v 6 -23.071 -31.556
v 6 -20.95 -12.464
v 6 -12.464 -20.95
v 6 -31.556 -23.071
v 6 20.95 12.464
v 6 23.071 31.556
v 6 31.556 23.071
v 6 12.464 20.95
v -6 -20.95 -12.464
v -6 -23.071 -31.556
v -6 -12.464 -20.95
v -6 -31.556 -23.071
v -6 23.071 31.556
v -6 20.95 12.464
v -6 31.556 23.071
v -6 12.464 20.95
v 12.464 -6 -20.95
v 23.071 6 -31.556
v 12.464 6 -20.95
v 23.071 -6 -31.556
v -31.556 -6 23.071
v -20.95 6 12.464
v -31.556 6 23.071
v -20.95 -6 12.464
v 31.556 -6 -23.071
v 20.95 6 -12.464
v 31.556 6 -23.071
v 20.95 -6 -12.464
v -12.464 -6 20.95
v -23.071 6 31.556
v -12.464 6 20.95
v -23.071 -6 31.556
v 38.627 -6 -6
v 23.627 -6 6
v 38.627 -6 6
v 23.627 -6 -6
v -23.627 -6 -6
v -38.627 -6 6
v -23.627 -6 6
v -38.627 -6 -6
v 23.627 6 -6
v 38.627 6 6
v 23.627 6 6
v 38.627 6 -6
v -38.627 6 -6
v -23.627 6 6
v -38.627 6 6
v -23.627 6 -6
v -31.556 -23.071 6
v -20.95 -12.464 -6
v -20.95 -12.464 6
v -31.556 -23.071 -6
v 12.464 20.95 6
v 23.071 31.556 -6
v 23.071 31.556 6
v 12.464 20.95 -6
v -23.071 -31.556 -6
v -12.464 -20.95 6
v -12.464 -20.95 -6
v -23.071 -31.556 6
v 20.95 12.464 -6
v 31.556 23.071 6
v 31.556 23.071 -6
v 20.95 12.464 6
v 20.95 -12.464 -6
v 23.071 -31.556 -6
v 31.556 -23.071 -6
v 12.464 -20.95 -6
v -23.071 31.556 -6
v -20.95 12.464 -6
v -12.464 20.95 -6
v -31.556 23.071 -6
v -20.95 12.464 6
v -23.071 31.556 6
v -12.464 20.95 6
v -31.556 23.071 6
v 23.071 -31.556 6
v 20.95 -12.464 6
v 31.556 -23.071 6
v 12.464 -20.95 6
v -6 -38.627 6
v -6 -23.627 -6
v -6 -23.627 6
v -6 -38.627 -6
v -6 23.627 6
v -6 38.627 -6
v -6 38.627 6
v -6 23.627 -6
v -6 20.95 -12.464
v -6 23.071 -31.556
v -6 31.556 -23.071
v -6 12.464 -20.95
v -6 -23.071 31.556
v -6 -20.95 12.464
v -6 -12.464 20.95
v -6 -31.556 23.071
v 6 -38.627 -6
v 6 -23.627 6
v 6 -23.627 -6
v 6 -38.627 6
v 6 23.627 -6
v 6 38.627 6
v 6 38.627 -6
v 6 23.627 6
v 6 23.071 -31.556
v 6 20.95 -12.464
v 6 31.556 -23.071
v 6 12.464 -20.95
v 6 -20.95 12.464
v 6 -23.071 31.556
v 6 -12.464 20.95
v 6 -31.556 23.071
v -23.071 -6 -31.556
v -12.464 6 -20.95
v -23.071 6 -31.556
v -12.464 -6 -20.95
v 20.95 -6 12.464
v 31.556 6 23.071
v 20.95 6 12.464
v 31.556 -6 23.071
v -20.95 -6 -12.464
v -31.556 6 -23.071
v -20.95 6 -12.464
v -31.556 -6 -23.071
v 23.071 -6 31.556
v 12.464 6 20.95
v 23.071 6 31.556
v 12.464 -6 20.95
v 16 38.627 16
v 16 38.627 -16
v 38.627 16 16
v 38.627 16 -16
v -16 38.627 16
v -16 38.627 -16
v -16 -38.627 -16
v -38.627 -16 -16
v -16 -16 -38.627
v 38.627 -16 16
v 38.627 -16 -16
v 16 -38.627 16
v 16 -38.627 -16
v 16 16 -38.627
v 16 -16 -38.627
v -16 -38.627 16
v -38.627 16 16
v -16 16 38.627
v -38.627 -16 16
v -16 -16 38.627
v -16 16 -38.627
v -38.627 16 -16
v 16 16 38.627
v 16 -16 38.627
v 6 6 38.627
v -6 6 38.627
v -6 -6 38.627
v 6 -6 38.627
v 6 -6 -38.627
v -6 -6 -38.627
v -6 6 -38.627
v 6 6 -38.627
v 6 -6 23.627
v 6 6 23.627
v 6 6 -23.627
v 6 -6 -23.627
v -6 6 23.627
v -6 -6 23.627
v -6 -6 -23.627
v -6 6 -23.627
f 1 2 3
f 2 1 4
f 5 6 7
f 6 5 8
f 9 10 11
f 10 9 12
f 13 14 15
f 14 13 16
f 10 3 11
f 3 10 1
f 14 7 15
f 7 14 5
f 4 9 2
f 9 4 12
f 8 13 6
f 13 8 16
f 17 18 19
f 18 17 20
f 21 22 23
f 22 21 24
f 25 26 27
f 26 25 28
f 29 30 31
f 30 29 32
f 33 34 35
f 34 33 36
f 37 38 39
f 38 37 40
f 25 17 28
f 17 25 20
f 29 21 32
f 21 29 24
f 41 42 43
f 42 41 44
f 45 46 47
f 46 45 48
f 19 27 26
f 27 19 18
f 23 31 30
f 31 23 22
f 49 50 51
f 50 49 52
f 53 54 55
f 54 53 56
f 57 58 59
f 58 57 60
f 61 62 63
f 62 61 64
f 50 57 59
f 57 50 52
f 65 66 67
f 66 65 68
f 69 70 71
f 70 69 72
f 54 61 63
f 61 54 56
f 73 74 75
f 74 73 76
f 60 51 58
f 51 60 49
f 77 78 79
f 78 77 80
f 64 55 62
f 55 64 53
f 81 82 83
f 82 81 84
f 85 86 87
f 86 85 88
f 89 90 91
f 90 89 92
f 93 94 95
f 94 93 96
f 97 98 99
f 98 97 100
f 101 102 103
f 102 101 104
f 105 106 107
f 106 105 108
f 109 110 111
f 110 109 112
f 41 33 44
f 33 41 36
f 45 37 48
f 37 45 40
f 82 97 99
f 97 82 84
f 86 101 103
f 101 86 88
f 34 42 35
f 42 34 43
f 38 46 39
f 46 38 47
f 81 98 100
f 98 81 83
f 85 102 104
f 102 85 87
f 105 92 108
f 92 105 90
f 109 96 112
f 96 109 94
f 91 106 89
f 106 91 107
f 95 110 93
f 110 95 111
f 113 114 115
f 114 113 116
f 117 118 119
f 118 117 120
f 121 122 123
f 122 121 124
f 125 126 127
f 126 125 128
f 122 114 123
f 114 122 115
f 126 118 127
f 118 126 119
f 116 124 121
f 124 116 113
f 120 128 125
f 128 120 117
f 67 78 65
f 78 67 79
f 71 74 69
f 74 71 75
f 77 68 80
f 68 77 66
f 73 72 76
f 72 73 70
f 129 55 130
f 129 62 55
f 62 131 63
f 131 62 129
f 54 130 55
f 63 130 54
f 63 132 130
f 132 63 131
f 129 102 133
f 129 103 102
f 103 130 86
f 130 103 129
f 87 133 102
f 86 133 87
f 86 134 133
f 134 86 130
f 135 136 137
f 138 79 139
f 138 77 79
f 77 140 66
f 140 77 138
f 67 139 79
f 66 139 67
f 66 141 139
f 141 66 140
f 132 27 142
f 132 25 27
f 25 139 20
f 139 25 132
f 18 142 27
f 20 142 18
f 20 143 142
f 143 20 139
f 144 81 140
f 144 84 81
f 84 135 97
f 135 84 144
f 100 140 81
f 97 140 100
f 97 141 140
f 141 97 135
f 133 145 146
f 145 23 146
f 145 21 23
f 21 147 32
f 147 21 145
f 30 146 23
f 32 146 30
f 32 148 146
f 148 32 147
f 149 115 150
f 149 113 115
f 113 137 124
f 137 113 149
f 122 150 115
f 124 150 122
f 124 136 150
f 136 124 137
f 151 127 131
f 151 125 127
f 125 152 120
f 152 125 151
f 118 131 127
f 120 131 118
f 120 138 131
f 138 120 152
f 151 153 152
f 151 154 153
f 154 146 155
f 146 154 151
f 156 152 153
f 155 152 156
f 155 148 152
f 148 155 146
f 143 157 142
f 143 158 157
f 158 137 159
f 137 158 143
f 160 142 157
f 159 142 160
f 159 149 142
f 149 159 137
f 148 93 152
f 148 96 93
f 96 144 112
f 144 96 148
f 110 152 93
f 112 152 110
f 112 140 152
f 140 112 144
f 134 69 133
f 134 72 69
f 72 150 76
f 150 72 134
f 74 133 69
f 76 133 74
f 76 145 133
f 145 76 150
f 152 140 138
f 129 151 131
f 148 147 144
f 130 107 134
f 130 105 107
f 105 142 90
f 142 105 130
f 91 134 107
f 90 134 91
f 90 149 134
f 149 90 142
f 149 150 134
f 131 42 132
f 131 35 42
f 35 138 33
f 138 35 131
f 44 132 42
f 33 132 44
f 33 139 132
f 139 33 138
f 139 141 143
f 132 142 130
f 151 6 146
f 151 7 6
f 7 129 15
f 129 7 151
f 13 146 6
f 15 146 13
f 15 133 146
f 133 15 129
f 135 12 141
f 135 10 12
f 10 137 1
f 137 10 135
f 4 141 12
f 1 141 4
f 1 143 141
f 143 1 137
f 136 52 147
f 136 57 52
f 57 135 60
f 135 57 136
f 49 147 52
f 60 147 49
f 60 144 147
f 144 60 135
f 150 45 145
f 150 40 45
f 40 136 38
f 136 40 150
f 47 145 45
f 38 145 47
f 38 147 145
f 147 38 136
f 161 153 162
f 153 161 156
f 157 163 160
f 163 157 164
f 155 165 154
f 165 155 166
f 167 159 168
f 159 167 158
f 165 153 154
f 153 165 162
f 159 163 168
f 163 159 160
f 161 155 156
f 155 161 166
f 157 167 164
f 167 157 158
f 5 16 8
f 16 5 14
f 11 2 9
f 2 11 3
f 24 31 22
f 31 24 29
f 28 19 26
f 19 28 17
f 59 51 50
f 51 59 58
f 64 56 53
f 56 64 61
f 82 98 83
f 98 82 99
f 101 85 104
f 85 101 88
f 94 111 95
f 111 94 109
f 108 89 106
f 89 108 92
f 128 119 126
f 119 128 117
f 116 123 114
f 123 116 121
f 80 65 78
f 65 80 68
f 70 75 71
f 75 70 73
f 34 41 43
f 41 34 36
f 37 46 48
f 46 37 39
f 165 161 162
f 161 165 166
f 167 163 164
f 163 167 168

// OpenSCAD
 square=32;
length=square+2*(sin(45)*square);
tunneldepth=15;
tunnelside=12;
difference(){
hull()
{
cube(center=true,size=[square,square,length]);
cube(center=true,size=[square,length,square]);
cube(center=true,size=[length,square,square]);
}//hull
cube(center=true,size=[tunnelside,tunnelside,length+.01]);
for(i=[-1,1]){
rotate([i*45,0,0]) cube(size=[tunnelside,tunnelside,length+.01],center=true);
rotate([0,i*45,0]) cube(size=[tunnelside,tunnelside,length+.01],center=true);
rotate([90,0,i*45]) cube(size=[tunnelside,tunnelside,length+.01],center=true);
rotate([90,0,45+i*45]) cube(size=[tunnelside,tunnelside,length+.01],center=true);
}//for
}//difference

backfill = length-2*tunneldepth;
cube(center=true,size=[tunnelside,tunnelside,backfill]);
for(i=[-1,1]){
rotate([i*45,0,0]) cube(size=[tunnelside,tunnelside,backfill],center=true);
rotate([0,i*45,0]) cube(size=[tunnelside,tunnelside,backfill],center=true);
rotate([90,0,i*45]) cube(size=[tunnelside,tunnelside,backfill],center=true);
rotate([90,0,45+i*45]) cube(size=[tunnelside,tunnelside,backfill],center=true);
}//for
